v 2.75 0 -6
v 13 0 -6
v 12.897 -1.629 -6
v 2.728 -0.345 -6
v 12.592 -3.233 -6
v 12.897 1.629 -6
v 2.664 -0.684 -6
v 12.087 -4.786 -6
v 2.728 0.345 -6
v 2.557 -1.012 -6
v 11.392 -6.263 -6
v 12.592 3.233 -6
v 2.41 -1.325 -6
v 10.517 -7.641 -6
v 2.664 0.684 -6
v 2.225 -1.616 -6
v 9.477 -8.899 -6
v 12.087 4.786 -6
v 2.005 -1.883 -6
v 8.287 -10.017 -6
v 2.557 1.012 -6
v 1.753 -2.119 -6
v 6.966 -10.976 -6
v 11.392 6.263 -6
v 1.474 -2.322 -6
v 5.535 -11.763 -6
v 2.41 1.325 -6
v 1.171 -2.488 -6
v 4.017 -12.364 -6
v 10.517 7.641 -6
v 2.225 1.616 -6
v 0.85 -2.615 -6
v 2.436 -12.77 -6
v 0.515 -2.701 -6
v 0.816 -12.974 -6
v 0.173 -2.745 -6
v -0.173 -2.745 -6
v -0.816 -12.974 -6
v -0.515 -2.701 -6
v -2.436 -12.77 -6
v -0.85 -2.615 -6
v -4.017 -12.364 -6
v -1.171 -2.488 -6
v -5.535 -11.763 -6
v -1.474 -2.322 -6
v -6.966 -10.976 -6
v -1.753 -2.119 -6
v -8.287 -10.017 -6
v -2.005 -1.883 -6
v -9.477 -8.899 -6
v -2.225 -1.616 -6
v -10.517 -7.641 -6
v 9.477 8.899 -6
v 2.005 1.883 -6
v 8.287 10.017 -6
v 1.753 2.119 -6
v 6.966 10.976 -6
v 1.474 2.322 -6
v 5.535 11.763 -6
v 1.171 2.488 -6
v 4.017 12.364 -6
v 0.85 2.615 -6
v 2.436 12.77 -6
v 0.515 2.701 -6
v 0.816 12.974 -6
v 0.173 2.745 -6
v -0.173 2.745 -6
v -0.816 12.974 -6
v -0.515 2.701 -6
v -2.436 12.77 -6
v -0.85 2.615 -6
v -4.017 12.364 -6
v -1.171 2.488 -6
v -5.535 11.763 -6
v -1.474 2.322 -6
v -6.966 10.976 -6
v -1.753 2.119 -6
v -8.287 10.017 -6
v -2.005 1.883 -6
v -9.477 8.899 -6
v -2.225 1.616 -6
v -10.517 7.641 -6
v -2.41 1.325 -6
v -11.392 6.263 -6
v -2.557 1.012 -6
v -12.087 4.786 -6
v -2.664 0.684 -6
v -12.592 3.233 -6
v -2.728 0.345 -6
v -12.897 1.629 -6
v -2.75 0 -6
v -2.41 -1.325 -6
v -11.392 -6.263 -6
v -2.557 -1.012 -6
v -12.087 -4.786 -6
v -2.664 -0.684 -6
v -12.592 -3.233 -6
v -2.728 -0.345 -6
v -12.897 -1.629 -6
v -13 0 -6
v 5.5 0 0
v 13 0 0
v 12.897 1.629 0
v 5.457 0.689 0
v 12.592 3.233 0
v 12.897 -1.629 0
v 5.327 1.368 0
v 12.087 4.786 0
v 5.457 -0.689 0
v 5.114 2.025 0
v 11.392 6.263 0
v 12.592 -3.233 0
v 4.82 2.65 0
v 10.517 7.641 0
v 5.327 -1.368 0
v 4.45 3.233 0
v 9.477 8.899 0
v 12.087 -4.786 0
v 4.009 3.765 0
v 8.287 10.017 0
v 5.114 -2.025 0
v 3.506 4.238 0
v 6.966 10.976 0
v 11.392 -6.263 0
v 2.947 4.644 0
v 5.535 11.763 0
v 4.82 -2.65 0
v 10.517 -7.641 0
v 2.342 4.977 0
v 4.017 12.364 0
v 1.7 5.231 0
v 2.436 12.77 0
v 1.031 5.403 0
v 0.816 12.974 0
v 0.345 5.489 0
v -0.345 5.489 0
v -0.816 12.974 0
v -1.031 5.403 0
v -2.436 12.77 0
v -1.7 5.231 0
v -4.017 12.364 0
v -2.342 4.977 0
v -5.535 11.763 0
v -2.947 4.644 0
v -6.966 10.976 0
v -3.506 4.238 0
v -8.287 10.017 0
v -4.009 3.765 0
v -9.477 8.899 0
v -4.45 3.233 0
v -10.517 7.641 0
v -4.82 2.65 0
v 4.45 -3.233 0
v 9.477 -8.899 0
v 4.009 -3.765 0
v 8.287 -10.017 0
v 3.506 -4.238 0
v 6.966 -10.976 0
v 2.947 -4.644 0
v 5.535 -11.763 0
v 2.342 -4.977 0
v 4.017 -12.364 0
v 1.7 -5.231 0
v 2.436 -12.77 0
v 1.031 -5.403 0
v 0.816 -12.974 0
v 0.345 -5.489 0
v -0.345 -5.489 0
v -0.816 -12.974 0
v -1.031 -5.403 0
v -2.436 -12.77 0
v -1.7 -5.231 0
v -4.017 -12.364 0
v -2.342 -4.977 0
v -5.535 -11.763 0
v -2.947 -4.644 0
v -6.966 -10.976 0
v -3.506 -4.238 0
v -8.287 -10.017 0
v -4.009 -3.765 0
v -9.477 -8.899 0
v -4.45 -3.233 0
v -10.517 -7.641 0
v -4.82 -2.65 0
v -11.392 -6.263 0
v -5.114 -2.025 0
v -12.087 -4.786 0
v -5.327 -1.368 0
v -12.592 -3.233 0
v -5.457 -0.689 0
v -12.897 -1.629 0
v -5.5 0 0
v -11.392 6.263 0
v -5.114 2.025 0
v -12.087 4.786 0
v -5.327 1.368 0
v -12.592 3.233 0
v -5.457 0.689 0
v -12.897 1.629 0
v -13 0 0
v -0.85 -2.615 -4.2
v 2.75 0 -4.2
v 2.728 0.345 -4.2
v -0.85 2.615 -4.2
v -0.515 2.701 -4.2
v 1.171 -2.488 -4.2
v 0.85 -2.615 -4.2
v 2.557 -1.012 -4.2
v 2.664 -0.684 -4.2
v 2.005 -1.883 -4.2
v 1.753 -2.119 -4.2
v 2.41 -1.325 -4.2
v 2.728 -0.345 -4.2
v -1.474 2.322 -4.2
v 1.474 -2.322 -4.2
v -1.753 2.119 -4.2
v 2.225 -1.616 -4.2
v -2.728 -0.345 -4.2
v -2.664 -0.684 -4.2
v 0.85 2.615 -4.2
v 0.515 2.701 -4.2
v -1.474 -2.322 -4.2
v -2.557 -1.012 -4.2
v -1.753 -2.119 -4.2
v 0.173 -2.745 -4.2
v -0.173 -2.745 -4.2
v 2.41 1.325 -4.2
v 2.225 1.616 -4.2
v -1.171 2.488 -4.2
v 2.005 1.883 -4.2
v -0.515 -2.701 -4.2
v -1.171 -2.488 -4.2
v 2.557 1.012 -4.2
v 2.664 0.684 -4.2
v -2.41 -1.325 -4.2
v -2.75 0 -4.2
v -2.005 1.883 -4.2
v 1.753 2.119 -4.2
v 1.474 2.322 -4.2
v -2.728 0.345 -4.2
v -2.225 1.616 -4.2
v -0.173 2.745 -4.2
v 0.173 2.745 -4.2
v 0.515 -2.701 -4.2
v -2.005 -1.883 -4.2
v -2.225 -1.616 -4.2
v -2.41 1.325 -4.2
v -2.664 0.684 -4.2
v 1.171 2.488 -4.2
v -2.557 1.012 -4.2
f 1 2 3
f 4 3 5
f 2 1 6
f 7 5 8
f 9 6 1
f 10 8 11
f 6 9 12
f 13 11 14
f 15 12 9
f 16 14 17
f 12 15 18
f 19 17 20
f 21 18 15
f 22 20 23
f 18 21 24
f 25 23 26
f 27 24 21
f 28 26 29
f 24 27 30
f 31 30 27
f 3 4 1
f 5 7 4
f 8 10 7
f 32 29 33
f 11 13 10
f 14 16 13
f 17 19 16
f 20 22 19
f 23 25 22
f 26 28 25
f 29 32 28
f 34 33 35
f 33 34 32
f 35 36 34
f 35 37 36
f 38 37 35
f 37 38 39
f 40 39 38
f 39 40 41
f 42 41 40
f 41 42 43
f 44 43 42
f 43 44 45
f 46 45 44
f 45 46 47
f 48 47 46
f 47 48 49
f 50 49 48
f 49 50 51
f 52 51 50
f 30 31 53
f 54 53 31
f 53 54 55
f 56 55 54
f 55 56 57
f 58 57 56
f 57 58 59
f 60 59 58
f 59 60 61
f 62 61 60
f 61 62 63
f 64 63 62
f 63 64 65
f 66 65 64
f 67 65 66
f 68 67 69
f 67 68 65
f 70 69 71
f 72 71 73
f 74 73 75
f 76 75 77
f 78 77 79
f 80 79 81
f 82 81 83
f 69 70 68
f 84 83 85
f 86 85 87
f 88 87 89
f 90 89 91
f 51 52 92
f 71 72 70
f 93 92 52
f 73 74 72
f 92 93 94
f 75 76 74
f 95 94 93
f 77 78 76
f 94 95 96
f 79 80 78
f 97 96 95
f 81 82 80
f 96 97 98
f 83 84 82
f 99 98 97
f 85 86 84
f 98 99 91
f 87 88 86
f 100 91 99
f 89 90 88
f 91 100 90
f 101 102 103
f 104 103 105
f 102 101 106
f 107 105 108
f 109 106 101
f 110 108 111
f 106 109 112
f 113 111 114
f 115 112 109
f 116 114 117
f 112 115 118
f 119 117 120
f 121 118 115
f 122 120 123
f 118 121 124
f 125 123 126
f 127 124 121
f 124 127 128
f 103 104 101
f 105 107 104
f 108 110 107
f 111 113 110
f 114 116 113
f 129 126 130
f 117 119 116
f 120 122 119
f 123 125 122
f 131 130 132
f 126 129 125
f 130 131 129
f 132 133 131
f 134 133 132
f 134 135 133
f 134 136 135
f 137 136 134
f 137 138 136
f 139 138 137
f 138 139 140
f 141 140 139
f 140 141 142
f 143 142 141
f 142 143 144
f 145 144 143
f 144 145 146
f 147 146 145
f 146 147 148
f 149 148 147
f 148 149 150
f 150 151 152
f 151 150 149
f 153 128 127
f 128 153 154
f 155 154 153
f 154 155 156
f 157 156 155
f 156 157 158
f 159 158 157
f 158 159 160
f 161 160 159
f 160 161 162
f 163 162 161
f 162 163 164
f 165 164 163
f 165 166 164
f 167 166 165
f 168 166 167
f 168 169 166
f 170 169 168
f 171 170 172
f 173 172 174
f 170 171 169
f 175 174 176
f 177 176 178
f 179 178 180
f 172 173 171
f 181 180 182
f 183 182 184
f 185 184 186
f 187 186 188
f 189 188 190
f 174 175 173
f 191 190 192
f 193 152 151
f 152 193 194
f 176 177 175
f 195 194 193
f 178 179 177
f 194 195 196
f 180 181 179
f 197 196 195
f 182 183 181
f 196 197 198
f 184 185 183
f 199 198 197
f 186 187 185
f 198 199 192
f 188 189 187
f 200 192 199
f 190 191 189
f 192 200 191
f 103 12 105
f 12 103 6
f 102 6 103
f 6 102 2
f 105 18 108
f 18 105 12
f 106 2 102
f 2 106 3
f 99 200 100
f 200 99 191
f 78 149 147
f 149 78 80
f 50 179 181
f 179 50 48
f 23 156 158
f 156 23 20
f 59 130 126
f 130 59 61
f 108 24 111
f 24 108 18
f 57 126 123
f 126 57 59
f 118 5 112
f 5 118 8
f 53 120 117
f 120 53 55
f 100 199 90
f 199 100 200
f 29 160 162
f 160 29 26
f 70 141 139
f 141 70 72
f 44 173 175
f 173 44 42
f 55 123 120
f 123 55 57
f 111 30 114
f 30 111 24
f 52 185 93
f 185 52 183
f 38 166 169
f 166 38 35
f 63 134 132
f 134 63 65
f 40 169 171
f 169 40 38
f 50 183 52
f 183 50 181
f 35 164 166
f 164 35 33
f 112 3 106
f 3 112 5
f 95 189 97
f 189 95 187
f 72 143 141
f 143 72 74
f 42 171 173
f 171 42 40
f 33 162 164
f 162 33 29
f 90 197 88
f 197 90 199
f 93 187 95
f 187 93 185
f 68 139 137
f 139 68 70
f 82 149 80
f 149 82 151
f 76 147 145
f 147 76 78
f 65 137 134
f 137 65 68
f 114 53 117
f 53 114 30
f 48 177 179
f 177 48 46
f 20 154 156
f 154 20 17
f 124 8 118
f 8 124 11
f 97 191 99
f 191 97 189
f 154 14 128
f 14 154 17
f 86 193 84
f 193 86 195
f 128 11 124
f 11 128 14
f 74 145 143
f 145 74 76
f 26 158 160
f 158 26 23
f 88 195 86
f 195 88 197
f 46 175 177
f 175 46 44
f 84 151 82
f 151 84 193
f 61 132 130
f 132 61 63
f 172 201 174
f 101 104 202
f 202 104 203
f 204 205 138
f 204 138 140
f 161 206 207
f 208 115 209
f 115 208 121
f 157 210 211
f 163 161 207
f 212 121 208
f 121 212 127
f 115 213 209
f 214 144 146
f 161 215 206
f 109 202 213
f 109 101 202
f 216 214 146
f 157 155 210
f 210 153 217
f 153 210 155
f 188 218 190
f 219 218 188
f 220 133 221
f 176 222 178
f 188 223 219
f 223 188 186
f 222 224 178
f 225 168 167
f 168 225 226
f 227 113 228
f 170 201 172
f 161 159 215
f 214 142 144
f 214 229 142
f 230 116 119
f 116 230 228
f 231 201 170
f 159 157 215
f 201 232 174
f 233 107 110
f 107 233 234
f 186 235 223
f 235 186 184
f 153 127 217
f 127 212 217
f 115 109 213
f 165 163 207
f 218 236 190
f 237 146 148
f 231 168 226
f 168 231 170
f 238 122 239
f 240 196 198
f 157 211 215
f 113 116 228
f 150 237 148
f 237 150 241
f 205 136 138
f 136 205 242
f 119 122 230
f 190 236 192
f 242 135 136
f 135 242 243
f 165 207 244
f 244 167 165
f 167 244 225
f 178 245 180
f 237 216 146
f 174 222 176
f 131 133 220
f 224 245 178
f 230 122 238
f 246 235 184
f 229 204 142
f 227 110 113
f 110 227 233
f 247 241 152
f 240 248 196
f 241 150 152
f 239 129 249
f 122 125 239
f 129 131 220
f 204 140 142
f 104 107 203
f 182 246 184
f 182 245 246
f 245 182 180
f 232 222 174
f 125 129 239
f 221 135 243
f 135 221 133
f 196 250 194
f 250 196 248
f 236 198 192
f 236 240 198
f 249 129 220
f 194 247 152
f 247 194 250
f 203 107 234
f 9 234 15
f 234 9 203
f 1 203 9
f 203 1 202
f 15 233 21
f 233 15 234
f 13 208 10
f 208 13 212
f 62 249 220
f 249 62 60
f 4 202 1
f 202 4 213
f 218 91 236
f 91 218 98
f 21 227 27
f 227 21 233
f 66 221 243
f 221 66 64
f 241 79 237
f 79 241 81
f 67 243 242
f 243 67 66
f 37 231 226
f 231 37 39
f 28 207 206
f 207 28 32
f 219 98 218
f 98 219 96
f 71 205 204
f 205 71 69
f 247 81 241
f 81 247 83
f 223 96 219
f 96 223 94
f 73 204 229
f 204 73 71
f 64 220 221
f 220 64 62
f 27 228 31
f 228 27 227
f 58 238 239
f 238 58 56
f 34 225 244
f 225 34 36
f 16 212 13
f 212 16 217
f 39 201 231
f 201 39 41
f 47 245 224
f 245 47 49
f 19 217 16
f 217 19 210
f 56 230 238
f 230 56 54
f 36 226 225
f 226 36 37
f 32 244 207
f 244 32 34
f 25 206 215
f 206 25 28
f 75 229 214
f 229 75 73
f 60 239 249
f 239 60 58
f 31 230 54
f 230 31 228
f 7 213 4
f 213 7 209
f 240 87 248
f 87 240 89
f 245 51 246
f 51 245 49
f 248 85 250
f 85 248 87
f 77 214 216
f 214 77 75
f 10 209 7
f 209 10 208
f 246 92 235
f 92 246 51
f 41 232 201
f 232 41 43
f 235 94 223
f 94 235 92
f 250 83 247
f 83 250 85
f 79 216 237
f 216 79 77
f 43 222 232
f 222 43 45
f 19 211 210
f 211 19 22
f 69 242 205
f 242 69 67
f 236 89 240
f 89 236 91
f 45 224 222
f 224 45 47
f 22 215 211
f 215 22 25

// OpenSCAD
$fn = 50;


difference() {
	union() {
		translate(v = [0, 0, -6.0000000000]) {
			cylinder(h = 6, r = 7.0000000000);
		}
		translate(v = [0, 0, -6.0000000000]) {
			cylinder(h = 6, r = 13.0000000000);
		}
	}
	union() {
		translate(v = [0, 0, 0]) {
			rotate(a = [0, 0, 0]) {
				difference() {
					union() {
						#translate(v = [0, 0, -6.0000000000]) {
							cylinder(h = 6, r = 2.2500000000);
						}
						#translate(v = [0, 0, -4.2000000000]) {
							cylinder(h = 4.2000000000, r1 = 2.7500000000, r2 = 5.5000000000);
						}
						#translate(v = [0, 0, -6.0000000000]) {
							cylinder(h = 6, r = 2.7500000000);
						}
						#translate(v = [0, 0, -6.0000000000]) {
							cylinder(h = 6, r = 2.2500000000);
						}
					}
					union();
				}
			}
		}
	}
}
